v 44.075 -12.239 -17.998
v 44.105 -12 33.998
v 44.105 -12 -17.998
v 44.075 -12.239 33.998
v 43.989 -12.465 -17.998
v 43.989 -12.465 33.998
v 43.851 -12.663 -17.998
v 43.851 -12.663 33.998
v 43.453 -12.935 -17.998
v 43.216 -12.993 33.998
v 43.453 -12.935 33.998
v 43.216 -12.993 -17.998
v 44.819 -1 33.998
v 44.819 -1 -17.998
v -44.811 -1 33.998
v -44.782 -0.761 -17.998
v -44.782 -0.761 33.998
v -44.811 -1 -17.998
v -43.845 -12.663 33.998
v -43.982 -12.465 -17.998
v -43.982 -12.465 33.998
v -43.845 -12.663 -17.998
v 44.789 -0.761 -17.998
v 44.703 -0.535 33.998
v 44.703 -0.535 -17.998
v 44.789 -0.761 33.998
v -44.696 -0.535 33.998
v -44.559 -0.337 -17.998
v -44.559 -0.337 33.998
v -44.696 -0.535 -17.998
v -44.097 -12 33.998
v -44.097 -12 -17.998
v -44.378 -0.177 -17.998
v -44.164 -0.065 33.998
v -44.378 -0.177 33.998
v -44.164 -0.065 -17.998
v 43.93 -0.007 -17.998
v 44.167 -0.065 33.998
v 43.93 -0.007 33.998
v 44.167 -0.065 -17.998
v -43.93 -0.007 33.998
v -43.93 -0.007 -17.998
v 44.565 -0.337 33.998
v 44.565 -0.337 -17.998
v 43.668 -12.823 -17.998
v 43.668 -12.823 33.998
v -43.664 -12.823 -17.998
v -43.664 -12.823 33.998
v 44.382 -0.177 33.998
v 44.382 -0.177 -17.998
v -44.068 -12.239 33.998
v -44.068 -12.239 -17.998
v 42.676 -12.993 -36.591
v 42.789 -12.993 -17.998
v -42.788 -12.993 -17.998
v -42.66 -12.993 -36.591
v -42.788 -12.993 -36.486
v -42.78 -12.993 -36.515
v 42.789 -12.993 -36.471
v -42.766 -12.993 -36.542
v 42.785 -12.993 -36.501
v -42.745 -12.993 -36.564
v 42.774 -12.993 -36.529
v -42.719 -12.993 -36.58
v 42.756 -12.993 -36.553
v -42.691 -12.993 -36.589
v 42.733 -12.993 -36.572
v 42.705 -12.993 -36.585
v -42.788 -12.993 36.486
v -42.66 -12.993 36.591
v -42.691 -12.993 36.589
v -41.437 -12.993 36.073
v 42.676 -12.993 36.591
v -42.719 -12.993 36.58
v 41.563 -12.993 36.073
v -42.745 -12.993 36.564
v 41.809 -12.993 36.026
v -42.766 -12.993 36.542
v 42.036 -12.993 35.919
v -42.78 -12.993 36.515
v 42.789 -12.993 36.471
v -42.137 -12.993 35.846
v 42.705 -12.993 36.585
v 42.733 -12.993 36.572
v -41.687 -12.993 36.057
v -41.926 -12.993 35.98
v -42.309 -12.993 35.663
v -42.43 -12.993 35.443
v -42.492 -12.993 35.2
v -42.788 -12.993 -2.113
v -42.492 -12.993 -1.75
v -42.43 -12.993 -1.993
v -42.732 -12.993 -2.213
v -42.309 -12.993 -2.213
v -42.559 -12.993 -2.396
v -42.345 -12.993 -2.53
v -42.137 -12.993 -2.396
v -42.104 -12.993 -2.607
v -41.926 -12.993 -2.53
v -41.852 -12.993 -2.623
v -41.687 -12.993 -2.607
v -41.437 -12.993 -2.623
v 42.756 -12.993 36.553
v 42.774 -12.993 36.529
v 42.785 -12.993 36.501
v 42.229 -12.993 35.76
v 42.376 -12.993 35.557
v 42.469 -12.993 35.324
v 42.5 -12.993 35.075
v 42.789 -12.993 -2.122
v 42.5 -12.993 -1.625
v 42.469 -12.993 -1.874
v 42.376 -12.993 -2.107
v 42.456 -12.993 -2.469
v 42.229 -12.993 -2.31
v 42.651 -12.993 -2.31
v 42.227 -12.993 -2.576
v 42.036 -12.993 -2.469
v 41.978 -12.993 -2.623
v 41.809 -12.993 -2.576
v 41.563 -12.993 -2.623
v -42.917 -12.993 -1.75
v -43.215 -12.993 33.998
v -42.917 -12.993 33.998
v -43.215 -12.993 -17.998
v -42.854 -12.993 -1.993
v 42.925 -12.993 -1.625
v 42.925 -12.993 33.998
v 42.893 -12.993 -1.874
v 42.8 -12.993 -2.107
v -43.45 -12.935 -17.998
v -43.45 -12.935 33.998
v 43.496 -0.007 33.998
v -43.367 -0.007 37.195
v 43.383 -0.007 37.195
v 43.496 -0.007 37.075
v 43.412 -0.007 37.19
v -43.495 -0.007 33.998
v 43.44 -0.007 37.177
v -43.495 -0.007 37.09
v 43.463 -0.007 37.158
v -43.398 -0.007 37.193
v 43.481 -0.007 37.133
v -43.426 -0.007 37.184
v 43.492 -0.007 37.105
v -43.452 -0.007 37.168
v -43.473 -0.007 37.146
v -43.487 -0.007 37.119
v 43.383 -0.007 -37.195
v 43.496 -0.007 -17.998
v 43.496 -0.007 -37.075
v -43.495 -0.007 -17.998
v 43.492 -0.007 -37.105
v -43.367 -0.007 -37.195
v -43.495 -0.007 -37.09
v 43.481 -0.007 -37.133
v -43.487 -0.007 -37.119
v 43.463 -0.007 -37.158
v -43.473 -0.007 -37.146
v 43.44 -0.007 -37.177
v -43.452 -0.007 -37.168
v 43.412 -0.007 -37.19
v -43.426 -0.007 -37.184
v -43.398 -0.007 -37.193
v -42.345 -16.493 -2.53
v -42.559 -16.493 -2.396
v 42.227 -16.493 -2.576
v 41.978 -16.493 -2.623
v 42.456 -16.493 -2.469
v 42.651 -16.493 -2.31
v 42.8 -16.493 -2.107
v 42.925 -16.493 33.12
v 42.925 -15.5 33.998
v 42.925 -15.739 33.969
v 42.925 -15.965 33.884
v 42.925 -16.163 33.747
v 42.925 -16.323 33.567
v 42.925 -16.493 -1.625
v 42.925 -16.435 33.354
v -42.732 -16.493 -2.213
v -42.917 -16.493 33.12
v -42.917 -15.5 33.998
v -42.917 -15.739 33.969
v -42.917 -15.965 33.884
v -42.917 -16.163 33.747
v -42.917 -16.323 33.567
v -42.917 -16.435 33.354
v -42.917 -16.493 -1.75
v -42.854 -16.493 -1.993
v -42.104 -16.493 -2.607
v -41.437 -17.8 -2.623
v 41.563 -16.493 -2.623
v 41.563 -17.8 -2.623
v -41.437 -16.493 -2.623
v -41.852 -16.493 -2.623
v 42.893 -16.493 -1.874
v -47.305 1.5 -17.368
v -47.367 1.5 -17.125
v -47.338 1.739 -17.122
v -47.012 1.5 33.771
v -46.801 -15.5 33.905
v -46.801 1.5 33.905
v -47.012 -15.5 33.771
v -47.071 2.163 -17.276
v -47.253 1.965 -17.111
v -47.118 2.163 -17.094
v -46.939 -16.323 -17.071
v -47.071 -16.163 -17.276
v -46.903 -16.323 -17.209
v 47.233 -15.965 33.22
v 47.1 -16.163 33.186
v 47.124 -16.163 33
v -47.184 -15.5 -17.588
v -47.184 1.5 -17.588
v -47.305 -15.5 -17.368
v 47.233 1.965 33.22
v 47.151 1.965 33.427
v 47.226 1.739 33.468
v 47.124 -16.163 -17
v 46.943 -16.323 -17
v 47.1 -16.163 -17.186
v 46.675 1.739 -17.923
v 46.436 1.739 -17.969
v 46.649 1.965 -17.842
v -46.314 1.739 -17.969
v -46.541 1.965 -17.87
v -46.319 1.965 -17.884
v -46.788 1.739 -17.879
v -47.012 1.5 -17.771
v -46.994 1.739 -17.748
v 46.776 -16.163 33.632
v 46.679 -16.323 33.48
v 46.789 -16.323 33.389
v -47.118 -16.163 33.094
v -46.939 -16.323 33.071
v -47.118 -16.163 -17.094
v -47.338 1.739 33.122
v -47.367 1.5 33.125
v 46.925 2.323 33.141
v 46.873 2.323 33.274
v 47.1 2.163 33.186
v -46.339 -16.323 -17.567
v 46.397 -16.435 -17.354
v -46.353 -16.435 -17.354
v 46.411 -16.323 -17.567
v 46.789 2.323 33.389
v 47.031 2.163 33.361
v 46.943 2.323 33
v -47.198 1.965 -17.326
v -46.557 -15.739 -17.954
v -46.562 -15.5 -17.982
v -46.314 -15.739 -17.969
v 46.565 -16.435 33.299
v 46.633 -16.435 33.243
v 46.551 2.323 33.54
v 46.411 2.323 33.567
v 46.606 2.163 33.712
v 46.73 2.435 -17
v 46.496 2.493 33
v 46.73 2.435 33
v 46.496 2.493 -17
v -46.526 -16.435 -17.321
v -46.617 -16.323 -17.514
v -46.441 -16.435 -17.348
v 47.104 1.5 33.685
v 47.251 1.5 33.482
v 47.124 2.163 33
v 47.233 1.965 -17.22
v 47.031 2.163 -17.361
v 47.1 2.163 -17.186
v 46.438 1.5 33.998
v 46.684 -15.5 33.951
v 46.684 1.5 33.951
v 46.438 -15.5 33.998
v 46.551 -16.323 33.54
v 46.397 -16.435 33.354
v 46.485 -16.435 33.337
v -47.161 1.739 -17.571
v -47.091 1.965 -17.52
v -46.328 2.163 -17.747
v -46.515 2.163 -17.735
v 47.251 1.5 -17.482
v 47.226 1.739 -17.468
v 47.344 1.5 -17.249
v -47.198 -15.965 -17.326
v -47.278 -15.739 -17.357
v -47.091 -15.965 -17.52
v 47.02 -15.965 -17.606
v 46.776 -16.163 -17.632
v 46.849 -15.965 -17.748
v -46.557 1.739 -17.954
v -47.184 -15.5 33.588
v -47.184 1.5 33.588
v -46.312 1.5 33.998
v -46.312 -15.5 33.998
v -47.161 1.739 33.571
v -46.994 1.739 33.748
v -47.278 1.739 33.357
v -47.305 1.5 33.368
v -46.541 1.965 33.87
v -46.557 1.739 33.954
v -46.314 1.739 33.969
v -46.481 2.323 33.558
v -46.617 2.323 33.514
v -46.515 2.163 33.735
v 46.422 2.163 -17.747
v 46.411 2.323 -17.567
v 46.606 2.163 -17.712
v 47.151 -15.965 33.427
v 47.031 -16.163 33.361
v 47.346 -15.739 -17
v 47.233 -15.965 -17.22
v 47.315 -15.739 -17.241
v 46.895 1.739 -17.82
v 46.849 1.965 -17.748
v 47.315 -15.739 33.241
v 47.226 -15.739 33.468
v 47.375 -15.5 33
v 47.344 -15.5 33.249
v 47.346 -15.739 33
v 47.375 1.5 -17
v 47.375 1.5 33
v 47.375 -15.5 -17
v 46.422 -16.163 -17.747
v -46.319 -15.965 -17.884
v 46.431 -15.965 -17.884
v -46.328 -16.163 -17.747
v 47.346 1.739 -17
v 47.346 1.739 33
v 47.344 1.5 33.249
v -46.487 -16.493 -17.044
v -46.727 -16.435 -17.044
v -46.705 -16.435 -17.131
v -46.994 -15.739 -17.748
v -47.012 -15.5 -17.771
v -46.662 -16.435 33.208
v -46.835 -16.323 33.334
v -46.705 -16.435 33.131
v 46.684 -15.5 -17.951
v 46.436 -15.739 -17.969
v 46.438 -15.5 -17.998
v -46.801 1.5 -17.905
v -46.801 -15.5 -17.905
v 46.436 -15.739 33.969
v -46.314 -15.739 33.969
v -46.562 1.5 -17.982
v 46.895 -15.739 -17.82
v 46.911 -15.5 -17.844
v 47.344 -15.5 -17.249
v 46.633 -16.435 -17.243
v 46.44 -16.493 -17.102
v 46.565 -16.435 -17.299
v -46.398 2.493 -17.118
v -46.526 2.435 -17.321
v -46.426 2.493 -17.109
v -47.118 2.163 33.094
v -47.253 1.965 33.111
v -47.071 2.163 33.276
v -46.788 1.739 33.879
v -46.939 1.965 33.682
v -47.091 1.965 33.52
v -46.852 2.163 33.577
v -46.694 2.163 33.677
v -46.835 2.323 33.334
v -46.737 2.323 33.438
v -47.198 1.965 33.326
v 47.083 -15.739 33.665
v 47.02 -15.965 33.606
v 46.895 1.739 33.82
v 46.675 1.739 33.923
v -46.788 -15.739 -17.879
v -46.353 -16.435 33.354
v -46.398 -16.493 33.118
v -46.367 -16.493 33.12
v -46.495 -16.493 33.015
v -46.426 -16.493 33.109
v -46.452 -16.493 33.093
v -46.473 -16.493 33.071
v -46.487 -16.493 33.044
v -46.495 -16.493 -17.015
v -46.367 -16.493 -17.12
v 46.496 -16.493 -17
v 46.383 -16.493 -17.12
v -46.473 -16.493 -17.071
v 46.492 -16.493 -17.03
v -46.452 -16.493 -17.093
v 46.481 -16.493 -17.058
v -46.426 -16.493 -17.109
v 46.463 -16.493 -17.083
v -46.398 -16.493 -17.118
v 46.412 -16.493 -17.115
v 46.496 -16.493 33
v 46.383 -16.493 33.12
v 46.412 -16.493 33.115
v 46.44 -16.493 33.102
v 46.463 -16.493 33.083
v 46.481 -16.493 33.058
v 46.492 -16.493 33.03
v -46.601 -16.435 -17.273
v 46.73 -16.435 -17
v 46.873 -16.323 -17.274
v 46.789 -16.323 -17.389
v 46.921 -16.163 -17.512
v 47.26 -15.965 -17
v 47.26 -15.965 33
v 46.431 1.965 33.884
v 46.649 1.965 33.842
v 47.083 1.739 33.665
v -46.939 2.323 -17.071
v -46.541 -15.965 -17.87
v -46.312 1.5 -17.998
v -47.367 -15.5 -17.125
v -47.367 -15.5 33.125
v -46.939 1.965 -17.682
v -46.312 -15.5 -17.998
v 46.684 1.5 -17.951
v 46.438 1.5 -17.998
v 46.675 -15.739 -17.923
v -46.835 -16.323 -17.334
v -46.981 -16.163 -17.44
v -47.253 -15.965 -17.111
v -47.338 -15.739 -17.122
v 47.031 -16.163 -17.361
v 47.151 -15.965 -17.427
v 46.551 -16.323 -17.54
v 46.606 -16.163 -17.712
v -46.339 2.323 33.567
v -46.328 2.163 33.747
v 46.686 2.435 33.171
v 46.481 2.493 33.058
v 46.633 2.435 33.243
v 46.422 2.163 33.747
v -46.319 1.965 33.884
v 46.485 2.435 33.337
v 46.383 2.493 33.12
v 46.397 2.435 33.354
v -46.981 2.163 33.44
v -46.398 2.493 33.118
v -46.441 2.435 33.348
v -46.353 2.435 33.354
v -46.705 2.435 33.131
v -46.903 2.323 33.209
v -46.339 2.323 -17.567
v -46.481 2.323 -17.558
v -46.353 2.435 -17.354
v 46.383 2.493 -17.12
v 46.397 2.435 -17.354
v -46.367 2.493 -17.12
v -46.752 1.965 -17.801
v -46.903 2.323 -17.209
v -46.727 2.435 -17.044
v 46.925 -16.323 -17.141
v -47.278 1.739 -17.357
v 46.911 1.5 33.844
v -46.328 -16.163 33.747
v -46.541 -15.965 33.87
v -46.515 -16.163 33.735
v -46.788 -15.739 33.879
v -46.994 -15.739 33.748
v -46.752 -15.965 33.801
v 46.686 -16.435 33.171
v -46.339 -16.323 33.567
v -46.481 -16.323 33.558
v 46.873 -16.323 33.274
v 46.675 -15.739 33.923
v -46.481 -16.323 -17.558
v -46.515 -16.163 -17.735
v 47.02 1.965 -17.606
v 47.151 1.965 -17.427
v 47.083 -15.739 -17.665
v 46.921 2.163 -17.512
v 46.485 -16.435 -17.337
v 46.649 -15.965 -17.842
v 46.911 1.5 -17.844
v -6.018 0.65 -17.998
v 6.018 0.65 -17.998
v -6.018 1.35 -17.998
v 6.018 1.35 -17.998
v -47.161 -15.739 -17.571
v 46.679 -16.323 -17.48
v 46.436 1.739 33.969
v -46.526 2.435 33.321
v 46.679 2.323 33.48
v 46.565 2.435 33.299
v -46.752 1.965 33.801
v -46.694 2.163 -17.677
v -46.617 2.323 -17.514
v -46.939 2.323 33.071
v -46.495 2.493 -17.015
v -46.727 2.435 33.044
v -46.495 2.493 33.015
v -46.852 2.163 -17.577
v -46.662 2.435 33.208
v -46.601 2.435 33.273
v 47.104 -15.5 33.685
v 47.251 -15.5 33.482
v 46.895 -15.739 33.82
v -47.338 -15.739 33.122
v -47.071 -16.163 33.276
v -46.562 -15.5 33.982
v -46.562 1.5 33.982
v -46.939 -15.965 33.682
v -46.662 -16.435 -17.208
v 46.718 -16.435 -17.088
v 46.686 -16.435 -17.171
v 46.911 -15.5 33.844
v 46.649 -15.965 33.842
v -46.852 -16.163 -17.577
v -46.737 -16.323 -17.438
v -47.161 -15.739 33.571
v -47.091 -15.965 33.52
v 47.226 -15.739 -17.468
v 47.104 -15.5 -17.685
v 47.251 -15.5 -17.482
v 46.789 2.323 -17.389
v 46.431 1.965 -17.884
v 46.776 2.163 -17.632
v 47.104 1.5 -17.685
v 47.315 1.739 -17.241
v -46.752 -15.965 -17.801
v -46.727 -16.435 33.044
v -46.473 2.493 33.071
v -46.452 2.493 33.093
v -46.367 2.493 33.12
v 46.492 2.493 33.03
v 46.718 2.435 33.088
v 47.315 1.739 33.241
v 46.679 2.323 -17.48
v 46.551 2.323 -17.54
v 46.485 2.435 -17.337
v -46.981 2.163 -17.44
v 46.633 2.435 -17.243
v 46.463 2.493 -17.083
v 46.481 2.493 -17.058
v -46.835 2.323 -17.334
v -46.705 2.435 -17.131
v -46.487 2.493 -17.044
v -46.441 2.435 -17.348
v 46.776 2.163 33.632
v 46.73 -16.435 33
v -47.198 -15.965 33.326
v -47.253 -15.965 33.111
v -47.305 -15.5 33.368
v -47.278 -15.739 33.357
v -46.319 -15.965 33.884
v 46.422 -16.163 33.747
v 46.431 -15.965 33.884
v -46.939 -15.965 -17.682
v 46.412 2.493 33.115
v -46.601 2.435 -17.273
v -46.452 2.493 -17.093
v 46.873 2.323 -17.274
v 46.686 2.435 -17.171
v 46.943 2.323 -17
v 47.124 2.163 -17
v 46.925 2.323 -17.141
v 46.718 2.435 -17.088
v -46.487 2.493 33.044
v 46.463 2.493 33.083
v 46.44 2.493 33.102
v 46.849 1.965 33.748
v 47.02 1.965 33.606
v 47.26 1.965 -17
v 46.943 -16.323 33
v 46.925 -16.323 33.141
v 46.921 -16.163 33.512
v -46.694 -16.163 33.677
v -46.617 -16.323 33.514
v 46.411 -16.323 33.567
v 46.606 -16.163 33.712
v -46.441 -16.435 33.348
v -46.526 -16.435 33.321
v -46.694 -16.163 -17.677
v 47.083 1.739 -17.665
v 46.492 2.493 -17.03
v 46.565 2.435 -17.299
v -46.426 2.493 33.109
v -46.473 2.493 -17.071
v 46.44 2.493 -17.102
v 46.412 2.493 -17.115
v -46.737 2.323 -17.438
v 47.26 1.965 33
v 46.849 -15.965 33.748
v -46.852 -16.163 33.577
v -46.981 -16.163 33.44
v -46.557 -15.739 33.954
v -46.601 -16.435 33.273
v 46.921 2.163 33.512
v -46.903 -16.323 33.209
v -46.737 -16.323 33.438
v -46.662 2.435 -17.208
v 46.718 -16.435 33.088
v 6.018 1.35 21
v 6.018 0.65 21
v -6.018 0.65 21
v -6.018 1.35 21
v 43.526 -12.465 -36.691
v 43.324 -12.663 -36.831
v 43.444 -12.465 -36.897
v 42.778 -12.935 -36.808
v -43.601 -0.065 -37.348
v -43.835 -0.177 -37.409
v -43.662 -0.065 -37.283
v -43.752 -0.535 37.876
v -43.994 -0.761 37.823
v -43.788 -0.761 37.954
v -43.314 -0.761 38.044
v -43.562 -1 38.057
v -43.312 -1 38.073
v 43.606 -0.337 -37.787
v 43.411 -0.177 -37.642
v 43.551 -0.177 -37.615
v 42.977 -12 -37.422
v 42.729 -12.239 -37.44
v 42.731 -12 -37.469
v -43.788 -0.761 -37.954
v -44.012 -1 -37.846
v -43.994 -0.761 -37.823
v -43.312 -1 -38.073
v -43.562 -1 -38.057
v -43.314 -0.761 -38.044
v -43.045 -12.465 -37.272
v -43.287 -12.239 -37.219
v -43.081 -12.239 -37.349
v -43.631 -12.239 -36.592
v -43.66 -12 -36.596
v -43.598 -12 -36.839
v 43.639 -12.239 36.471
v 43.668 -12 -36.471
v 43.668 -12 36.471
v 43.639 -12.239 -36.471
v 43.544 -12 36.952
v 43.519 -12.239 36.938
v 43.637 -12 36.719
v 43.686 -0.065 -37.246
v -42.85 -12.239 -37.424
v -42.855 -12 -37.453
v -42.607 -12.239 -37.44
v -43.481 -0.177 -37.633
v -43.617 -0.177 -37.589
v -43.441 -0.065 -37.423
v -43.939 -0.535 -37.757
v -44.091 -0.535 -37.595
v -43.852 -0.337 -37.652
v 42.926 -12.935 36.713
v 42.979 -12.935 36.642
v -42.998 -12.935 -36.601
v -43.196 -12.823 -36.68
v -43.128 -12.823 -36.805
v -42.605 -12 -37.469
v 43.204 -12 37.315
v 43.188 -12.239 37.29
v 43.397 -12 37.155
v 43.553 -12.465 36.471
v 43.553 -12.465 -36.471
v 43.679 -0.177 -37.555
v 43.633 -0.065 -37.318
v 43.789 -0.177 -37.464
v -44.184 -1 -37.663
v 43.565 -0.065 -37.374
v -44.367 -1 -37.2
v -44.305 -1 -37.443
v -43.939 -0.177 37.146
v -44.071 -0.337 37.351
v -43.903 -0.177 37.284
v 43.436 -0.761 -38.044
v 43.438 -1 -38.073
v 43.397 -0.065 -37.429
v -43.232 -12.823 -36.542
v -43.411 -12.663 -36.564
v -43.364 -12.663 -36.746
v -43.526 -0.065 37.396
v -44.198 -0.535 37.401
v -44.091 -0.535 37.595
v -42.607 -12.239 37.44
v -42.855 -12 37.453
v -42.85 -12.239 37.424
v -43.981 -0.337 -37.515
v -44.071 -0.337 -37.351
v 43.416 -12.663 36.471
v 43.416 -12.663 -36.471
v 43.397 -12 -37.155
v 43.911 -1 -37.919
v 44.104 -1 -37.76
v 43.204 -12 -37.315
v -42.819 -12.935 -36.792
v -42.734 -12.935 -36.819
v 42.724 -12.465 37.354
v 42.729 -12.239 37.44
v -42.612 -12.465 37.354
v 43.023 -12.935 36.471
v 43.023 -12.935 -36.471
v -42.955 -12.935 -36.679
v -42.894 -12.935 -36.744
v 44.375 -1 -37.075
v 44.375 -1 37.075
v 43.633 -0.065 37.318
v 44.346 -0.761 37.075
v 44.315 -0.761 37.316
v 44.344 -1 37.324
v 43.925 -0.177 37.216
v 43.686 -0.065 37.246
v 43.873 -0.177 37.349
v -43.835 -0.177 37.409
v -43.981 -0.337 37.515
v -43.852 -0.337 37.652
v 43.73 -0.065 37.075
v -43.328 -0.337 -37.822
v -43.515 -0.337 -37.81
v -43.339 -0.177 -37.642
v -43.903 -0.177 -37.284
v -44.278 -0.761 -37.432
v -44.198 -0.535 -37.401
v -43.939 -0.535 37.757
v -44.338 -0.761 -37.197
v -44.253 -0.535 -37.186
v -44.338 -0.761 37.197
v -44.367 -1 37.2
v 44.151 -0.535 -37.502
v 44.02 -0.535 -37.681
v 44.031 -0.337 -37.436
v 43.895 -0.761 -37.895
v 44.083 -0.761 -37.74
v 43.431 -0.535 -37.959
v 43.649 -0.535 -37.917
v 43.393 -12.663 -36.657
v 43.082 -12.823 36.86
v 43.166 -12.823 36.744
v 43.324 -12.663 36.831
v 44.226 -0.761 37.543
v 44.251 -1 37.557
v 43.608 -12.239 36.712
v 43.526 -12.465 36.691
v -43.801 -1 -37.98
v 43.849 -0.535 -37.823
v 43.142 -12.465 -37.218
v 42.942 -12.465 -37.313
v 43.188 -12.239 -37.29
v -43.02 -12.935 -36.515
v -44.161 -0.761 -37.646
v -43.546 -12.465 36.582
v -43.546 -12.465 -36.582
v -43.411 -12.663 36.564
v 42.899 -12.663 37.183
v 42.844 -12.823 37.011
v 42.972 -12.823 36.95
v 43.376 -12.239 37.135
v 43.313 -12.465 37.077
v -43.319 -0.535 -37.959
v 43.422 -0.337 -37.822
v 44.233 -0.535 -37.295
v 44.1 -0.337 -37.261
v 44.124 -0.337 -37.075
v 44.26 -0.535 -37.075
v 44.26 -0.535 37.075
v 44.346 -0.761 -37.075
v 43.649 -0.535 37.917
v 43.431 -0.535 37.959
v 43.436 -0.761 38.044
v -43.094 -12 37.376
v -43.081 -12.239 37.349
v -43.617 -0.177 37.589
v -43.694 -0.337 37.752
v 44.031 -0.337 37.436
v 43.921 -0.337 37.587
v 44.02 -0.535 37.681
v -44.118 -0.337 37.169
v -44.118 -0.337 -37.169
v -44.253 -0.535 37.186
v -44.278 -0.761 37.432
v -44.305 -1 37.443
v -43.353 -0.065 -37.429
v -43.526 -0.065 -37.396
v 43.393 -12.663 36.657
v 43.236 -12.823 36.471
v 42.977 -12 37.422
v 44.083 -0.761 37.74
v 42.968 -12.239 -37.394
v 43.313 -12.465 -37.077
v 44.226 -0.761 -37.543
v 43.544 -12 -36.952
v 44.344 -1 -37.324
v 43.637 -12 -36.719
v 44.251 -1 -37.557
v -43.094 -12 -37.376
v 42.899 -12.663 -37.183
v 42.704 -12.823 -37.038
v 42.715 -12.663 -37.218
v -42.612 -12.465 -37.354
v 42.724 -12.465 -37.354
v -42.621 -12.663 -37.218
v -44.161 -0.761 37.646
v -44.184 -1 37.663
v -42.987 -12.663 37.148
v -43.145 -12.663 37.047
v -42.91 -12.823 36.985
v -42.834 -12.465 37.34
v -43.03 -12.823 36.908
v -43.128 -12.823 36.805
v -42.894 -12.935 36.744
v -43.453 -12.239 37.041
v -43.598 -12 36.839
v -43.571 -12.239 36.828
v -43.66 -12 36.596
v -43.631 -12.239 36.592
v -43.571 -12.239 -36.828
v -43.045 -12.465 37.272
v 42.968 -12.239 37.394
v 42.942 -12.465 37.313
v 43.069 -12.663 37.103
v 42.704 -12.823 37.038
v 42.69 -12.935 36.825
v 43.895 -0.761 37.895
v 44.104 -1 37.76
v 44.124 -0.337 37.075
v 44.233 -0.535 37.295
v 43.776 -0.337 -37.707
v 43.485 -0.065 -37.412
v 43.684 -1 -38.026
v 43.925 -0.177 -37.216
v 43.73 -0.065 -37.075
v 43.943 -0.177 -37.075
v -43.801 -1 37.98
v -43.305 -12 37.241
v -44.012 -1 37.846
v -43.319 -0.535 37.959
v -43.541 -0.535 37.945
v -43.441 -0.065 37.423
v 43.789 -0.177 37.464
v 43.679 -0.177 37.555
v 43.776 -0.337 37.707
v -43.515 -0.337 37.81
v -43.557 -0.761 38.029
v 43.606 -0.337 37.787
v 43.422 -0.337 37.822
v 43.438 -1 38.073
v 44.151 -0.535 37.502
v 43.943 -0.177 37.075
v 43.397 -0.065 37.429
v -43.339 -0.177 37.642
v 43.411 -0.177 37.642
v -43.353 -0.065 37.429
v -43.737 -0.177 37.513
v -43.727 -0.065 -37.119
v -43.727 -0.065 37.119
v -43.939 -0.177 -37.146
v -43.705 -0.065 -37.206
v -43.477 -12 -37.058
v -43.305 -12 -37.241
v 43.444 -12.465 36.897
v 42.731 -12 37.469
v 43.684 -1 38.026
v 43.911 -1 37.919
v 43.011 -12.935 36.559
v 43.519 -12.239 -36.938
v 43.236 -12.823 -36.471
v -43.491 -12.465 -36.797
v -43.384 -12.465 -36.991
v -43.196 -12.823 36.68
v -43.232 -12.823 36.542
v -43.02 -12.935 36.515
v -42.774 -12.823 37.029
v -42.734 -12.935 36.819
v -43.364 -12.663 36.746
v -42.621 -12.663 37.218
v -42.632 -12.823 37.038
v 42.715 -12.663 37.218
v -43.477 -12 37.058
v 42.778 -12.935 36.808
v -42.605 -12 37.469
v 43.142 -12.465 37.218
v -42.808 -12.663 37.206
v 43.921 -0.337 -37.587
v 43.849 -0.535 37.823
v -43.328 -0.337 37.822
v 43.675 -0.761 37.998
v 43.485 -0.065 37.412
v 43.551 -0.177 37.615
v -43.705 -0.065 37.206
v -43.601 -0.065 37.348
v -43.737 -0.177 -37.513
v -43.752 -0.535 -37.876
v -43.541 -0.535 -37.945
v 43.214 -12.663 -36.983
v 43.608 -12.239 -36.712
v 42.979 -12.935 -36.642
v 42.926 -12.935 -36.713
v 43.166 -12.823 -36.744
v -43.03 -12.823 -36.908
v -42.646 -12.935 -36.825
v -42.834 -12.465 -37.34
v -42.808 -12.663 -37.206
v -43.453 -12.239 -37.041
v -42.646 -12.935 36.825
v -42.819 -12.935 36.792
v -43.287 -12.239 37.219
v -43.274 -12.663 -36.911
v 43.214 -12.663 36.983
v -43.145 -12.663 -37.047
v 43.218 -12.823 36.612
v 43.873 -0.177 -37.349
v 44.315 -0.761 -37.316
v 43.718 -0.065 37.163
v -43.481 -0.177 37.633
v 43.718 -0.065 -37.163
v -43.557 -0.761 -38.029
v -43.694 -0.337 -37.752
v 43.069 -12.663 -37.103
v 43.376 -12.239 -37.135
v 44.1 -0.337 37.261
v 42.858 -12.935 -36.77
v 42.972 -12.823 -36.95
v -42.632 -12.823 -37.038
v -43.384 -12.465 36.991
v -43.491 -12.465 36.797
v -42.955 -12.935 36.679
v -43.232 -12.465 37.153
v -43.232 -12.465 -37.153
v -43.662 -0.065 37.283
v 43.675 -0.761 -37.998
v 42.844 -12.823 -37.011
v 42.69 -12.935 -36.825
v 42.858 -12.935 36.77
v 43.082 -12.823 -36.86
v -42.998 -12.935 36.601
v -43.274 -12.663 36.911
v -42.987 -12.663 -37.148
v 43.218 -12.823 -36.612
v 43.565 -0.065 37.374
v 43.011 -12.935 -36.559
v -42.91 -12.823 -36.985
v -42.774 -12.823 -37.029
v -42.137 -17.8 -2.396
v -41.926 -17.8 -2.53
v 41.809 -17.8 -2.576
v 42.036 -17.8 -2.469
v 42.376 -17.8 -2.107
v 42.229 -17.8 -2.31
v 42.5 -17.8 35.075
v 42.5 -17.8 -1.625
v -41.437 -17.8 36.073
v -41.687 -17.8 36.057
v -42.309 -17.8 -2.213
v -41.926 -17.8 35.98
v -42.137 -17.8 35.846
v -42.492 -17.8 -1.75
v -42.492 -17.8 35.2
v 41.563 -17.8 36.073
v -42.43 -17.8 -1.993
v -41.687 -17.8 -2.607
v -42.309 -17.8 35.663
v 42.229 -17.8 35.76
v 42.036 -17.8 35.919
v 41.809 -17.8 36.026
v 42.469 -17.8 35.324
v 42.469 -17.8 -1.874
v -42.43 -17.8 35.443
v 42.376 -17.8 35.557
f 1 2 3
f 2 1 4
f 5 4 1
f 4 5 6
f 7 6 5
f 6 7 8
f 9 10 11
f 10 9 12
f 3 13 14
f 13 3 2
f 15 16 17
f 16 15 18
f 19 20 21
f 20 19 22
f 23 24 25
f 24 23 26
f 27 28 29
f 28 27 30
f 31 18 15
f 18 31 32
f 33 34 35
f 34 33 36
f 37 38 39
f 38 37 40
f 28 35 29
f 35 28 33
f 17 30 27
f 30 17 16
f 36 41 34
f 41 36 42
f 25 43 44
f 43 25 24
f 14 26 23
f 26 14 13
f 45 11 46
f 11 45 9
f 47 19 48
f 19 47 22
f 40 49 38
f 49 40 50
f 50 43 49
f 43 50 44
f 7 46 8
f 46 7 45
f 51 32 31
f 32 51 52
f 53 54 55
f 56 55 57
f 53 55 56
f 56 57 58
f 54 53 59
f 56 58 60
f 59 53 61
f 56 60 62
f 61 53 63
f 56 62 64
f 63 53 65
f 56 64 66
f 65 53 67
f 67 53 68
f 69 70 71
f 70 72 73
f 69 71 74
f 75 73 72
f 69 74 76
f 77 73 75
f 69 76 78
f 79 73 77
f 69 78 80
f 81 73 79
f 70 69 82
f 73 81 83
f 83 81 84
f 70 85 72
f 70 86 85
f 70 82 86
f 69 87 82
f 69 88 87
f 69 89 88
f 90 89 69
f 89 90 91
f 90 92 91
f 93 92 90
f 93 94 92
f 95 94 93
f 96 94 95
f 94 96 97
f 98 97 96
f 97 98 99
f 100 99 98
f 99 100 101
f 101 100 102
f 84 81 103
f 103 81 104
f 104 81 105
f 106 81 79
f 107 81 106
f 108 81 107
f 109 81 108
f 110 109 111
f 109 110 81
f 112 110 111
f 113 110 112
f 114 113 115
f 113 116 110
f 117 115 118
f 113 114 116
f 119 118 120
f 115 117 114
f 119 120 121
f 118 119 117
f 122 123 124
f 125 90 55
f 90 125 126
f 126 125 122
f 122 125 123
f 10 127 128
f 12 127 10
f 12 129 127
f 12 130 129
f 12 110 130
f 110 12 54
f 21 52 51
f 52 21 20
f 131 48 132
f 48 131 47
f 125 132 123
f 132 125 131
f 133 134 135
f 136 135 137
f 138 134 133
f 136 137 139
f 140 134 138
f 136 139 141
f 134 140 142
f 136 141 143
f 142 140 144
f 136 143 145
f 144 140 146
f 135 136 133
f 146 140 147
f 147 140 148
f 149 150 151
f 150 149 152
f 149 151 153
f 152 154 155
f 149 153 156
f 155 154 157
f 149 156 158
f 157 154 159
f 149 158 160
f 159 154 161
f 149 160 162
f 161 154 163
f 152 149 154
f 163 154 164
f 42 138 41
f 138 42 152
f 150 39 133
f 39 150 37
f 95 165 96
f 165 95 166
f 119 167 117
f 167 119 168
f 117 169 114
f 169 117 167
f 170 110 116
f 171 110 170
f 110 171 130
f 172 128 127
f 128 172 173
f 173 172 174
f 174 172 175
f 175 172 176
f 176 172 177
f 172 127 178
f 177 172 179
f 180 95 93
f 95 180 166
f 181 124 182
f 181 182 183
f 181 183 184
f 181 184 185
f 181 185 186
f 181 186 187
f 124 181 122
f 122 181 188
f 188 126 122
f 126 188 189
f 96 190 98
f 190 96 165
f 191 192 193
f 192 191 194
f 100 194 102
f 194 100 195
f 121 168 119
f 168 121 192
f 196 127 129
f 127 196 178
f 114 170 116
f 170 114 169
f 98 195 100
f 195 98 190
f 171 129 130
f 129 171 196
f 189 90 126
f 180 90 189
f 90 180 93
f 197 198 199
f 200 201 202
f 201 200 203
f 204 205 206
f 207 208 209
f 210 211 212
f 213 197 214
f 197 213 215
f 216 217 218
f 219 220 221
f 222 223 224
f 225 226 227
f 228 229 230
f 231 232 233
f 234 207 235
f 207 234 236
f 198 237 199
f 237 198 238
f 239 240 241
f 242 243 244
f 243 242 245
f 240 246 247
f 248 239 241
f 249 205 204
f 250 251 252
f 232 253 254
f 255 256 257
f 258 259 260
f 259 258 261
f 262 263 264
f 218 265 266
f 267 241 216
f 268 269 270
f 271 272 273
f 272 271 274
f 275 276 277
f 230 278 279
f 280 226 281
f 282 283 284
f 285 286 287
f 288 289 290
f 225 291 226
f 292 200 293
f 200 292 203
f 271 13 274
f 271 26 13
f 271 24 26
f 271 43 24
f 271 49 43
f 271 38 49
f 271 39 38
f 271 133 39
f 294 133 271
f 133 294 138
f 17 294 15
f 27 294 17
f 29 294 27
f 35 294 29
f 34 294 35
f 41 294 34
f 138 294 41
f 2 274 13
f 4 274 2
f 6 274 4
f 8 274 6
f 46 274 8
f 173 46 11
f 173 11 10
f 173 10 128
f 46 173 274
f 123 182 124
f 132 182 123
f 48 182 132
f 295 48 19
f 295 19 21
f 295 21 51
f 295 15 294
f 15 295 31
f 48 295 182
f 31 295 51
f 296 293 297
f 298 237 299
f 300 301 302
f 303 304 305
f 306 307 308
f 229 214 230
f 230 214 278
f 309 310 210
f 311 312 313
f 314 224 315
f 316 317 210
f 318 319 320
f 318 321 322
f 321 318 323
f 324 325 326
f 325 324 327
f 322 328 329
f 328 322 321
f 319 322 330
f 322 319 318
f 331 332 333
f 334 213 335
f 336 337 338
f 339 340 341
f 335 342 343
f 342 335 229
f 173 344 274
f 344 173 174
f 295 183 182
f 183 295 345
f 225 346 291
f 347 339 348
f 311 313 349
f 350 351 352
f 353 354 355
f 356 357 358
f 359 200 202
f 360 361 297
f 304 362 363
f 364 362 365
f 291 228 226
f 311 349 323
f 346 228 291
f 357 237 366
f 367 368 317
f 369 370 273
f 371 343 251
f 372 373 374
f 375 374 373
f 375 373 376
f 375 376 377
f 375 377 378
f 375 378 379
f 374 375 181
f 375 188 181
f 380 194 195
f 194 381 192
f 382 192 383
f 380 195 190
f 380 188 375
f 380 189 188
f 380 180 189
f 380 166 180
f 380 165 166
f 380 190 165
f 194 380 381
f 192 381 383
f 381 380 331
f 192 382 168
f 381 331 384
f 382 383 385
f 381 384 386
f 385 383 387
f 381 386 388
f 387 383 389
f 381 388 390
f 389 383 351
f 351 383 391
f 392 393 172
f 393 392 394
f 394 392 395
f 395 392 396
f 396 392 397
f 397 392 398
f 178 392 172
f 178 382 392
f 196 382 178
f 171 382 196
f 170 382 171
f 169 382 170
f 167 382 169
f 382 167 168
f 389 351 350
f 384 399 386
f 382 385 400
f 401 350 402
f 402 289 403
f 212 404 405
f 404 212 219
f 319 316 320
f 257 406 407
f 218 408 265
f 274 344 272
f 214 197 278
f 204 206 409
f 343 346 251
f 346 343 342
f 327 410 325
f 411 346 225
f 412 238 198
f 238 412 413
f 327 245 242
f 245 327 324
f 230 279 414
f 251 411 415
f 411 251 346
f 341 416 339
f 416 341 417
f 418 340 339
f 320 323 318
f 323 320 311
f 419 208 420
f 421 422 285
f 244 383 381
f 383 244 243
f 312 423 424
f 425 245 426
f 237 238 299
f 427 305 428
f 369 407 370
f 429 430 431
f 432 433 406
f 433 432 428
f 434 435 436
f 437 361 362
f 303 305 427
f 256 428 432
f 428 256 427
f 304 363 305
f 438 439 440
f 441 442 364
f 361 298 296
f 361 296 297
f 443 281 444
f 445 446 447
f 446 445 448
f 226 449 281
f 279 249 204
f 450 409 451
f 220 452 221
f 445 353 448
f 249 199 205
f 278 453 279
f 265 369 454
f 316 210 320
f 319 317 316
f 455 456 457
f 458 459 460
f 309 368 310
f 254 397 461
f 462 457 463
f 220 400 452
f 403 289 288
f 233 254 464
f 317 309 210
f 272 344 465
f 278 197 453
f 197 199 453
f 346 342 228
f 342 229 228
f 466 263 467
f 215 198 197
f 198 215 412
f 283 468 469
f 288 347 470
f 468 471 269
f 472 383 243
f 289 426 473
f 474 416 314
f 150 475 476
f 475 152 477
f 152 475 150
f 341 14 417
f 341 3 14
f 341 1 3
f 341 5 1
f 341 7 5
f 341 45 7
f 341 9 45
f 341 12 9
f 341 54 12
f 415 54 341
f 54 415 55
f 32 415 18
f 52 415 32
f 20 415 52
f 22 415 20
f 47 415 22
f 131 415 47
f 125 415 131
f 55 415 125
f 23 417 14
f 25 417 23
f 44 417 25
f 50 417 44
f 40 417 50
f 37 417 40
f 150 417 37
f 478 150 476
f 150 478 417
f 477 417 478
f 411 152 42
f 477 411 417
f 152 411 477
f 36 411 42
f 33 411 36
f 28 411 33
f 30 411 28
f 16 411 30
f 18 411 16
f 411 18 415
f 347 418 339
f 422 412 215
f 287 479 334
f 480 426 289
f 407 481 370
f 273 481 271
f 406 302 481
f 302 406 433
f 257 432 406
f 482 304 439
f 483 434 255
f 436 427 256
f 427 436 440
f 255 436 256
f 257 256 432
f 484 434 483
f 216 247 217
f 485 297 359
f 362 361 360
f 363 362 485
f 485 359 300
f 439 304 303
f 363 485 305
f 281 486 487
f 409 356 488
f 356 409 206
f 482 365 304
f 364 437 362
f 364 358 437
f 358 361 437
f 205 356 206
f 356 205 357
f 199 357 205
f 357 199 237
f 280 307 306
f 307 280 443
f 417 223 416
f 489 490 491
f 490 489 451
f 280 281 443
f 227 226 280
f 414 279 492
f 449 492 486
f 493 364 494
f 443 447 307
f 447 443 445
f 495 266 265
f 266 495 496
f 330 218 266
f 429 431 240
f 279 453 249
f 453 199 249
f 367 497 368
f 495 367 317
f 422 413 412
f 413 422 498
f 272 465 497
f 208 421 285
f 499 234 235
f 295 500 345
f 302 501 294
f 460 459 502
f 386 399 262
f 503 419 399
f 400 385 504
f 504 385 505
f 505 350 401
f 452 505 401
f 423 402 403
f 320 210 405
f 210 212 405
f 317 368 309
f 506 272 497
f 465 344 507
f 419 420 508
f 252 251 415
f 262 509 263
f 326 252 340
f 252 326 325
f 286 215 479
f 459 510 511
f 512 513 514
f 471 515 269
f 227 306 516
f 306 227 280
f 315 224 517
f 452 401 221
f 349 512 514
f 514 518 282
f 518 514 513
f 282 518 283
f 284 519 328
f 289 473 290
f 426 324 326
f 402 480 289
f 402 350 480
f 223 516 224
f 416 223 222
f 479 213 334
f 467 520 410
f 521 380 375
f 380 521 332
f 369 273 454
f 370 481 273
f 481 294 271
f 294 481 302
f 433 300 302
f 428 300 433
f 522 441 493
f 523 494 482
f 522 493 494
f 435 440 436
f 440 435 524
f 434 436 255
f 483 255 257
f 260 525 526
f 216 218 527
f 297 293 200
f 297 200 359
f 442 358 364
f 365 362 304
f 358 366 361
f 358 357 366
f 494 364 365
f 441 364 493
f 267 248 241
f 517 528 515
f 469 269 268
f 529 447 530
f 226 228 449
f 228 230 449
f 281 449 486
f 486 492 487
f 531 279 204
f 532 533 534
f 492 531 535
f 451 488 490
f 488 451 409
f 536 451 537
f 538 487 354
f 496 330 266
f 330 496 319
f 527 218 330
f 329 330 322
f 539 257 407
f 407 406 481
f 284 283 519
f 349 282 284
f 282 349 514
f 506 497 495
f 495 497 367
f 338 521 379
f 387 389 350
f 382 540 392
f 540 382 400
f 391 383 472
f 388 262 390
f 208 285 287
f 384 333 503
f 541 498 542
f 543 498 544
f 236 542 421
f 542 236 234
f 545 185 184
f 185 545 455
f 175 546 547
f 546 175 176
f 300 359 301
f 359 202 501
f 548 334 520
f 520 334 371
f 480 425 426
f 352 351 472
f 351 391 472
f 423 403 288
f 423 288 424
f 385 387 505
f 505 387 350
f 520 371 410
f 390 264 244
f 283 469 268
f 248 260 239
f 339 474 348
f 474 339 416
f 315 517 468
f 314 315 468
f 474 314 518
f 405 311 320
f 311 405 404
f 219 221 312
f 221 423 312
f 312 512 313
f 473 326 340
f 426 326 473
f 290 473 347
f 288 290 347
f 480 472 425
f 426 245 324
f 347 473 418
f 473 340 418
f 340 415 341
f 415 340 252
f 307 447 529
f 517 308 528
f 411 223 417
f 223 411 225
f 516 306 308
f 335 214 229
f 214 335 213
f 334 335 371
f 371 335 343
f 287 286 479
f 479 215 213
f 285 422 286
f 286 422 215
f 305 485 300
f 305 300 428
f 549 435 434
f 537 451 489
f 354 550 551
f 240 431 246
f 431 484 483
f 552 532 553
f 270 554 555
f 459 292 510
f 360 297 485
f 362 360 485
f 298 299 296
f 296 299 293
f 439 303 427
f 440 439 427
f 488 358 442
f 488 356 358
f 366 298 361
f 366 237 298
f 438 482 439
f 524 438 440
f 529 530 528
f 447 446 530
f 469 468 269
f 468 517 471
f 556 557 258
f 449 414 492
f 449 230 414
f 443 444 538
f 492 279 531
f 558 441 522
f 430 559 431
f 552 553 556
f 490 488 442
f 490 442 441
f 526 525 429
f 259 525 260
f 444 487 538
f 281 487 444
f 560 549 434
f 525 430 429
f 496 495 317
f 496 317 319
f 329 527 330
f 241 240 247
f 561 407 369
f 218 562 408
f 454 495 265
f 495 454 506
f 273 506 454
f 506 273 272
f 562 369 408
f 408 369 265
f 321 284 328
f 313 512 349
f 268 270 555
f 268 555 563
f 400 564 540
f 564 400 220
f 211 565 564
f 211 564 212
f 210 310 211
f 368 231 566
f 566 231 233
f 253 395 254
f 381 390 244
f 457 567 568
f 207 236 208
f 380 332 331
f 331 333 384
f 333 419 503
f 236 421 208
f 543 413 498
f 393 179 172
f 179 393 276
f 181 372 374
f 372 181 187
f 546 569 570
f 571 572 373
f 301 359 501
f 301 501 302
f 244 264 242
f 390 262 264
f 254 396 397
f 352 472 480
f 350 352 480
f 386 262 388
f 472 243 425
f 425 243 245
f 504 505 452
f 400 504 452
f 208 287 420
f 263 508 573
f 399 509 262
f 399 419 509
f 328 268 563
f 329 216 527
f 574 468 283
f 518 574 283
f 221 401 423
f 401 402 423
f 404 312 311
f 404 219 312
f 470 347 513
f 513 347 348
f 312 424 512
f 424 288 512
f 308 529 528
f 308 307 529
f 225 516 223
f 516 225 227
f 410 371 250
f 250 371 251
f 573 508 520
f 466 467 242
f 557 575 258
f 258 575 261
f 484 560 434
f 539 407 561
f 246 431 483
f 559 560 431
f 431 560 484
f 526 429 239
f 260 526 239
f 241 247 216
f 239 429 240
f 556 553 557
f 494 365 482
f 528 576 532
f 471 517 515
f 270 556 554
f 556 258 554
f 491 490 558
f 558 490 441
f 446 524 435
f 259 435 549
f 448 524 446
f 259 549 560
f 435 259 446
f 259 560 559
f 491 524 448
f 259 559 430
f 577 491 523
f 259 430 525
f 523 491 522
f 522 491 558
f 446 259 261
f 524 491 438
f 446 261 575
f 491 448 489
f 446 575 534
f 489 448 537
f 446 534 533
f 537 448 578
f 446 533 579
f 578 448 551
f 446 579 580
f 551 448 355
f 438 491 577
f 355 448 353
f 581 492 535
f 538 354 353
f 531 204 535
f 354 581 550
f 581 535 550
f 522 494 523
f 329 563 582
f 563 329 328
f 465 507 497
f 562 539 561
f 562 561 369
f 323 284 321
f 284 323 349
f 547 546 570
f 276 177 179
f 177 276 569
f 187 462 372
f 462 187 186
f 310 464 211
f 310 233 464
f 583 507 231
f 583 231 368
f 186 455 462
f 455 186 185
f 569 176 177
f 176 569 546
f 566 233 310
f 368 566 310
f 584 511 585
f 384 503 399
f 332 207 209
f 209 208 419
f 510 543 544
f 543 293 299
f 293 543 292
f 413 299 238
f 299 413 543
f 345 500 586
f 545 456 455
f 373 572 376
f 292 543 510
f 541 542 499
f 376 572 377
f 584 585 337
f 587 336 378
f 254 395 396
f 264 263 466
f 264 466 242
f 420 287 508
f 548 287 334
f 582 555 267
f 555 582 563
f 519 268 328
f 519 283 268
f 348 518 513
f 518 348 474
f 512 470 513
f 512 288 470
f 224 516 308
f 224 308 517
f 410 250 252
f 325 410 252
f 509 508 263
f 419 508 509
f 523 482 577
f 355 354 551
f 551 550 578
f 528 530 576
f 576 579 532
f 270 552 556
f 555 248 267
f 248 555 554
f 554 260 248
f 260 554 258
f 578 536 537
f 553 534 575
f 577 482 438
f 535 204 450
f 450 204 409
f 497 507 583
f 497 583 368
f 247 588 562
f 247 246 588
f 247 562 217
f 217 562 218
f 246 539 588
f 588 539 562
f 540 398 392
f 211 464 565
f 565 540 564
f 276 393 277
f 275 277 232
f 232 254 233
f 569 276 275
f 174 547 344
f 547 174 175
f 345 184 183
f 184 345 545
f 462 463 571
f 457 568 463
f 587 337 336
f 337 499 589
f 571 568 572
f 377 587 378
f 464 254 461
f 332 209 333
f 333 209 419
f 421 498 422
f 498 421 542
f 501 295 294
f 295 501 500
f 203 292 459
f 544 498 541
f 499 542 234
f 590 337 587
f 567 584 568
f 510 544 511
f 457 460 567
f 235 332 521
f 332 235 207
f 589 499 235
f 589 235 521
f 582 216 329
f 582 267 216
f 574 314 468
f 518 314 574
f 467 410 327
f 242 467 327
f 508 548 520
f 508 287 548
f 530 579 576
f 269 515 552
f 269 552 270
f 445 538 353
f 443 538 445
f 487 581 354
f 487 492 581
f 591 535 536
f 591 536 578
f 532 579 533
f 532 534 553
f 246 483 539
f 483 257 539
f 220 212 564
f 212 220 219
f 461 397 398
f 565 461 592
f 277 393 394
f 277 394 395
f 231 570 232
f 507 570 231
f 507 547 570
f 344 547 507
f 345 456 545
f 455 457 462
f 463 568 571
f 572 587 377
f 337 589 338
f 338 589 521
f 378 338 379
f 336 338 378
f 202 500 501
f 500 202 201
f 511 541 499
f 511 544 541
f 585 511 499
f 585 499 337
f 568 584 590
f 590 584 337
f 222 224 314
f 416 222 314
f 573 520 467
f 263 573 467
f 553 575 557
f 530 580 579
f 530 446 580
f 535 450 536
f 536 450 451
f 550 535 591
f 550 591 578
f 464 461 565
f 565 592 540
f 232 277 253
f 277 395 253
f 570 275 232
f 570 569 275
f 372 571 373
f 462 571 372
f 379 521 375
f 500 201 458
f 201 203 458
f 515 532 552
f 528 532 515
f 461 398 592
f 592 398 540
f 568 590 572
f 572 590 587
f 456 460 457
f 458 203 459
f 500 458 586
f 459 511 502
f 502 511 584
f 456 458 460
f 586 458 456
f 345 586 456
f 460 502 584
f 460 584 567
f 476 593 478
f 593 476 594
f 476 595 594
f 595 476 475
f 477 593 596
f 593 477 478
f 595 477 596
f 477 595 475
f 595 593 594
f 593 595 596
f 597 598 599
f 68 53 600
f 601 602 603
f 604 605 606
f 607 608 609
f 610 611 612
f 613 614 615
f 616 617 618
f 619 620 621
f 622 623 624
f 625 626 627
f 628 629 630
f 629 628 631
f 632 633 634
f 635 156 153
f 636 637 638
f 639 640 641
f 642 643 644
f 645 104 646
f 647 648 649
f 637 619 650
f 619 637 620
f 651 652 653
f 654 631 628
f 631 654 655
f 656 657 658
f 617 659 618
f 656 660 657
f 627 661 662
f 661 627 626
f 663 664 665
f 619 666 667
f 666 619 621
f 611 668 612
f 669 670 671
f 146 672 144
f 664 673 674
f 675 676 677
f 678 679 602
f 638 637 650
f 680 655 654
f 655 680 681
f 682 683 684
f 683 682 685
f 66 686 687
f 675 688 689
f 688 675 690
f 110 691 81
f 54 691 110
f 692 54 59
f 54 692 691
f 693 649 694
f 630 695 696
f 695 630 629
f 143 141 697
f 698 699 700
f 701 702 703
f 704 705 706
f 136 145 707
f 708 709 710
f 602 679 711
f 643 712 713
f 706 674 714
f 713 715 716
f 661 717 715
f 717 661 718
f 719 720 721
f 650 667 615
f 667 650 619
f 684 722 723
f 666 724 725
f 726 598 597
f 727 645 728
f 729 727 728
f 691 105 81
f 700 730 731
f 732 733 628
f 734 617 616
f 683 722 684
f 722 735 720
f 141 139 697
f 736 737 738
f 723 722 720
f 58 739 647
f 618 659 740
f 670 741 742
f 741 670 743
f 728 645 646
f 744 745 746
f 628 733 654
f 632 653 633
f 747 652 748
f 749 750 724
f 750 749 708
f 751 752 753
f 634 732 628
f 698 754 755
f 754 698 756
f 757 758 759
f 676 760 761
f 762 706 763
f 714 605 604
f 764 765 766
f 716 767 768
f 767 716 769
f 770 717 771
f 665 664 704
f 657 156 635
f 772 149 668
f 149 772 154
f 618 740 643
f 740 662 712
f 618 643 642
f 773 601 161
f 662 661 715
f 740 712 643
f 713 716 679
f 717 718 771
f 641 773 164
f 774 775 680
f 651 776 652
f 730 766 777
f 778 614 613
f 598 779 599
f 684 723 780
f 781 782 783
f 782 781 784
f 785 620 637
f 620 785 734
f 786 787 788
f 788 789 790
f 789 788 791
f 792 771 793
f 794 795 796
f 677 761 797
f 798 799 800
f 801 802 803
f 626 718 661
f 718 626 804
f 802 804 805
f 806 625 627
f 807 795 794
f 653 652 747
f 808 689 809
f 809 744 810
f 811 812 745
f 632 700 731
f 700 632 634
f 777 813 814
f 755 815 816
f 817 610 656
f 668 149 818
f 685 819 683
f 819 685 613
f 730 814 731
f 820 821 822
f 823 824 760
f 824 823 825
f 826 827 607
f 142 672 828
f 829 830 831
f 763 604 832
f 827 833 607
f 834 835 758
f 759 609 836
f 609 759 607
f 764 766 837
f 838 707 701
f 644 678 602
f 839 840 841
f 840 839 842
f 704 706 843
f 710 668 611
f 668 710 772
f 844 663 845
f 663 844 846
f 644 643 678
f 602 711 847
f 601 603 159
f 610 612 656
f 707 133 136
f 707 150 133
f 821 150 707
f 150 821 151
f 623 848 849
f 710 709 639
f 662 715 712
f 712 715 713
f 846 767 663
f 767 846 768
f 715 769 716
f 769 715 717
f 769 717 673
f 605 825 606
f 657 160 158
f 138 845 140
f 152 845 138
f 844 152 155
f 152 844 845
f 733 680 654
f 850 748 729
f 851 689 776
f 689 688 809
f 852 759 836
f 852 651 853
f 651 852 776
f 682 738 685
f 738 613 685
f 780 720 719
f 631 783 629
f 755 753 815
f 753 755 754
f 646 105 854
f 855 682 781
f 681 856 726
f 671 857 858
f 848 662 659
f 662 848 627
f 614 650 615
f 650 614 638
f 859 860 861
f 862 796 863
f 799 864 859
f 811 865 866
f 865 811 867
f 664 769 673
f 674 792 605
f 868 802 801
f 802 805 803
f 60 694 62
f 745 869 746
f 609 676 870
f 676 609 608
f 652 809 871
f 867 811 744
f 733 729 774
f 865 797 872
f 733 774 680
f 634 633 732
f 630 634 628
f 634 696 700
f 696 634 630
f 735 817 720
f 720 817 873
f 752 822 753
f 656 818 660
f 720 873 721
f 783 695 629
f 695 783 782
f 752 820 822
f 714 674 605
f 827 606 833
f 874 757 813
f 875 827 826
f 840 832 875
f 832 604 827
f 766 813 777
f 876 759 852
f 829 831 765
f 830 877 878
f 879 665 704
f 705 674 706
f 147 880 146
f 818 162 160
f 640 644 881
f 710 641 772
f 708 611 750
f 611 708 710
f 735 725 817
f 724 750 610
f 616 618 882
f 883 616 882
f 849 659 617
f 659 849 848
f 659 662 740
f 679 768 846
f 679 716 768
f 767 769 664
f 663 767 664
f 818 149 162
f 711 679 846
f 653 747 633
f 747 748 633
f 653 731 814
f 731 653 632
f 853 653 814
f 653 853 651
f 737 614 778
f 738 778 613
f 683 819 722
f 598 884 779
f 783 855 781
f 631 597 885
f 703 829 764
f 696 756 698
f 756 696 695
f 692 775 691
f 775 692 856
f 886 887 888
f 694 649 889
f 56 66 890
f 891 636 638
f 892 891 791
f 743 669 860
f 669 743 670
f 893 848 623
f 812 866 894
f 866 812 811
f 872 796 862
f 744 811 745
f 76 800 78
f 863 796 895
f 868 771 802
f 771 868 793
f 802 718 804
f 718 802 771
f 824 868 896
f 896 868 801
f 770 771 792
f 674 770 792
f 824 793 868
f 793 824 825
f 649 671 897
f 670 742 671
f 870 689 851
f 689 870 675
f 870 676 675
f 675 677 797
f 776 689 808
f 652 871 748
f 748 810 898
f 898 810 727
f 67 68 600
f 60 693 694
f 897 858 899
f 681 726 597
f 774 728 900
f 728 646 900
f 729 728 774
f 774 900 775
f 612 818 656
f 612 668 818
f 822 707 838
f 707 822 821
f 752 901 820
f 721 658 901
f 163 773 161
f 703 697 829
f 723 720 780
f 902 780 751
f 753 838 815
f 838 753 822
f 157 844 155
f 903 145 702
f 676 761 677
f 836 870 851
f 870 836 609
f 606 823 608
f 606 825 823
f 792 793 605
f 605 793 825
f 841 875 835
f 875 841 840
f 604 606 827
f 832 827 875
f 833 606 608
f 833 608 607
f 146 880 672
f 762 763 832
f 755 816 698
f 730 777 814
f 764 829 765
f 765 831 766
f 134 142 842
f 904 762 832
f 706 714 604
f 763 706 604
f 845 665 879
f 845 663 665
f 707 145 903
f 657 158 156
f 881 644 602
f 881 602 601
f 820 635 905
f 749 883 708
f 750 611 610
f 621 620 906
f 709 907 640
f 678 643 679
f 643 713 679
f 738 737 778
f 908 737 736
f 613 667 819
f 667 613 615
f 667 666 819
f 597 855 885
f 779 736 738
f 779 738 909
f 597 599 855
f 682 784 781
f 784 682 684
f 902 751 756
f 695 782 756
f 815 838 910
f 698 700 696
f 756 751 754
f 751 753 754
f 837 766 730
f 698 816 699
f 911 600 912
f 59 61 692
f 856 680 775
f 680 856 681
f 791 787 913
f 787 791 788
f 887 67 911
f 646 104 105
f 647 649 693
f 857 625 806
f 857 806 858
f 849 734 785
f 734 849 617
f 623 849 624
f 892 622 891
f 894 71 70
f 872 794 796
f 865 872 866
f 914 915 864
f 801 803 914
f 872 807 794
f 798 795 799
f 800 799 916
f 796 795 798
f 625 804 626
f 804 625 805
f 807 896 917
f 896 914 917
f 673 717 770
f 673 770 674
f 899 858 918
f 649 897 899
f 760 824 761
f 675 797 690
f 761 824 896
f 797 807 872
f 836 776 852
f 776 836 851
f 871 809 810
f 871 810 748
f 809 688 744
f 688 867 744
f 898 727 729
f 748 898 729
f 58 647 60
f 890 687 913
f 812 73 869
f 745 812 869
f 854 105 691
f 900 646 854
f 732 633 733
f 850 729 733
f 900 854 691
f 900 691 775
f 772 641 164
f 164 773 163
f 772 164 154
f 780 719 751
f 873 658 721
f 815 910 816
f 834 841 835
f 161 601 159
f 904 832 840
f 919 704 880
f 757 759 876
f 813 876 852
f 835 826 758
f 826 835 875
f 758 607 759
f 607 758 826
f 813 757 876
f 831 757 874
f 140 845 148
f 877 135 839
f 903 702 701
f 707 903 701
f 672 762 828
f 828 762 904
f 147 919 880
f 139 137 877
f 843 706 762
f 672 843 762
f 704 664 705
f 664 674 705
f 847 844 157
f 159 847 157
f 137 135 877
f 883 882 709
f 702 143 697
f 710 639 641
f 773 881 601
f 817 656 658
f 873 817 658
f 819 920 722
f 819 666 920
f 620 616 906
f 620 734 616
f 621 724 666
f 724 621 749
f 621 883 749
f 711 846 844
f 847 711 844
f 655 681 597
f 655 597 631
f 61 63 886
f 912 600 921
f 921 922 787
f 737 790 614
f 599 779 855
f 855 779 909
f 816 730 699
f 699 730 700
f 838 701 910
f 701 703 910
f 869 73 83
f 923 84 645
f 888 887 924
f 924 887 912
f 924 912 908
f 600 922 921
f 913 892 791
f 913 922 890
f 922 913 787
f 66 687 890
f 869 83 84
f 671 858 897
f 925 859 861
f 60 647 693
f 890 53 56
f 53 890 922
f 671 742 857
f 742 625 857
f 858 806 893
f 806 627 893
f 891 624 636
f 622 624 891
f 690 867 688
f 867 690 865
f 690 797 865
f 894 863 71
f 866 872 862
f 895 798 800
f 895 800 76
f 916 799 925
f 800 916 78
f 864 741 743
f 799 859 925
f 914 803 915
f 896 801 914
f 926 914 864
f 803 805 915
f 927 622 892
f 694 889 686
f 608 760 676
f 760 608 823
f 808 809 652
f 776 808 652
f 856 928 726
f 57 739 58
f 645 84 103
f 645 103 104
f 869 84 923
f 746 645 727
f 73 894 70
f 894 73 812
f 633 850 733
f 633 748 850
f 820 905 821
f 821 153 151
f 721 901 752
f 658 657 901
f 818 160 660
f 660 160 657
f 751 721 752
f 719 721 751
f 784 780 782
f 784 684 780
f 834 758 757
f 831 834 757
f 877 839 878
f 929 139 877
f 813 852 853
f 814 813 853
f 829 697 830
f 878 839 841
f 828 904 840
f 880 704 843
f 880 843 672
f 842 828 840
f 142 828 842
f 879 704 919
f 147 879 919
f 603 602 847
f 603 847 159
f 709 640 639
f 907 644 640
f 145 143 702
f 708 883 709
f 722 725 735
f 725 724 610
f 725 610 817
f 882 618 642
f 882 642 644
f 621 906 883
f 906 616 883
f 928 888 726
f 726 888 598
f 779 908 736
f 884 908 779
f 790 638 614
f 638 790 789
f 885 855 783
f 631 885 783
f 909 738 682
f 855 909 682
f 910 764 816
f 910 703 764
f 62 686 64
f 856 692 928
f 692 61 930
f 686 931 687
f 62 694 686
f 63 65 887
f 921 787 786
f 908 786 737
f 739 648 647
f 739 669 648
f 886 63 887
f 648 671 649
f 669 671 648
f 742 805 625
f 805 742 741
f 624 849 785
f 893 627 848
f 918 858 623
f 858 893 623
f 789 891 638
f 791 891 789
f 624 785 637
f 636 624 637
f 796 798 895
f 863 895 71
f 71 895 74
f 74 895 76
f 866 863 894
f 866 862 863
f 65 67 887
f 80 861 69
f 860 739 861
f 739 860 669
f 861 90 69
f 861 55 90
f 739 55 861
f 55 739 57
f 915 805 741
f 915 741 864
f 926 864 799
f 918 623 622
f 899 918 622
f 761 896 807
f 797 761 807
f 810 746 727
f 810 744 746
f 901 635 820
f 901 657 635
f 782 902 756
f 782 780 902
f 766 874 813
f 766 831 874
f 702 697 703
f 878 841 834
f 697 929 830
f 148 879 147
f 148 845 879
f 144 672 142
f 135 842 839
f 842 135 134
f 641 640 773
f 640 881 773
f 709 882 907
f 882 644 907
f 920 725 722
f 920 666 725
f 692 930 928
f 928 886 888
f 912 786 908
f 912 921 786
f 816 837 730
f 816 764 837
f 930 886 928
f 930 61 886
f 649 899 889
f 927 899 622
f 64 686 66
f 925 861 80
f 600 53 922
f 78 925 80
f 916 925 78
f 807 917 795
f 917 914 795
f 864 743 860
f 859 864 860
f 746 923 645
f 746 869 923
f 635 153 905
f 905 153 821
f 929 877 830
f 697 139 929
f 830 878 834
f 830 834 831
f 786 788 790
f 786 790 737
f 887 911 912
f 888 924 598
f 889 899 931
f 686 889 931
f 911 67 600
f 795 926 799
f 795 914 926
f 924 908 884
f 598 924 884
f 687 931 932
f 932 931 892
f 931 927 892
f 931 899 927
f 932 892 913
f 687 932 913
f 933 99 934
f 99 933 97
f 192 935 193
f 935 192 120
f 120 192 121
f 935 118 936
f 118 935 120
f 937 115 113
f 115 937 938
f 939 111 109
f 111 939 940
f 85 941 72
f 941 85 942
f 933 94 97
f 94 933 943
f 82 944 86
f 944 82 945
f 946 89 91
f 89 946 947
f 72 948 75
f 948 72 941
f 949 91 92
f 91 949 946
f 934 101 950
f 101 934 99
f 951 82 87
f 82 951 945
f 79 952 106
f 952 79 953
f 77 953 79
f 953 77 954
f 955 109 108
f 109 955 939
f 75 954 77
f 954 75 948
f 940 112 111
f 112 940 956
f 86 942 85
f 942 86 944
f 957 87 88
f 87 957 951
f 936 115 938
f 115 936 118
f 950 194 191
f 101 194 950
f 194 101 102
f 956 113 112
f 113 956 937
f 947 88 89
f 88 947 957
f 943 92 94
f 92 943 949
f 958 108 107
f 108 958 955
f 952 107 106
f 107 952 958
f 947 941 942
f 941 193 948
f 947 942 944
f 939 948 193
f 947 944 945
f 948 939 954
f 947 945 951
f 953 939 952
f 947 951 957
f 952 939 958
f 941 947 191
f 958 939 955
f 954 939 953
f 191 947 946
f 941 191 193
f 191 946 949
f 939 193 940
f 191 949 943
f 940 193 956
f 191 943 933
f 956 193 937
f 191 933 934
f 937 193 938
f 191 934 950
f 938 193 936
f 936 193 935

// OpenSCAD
$fn=25;
ezWidth = 88.75;
ezLength = 76.15;
ezHeight = 13;
smooth = 1;

module ezpass() {
    // base
    translate([0,0,smooth]) minkowski() {
        linear_extrude(height=ezHeight-smooth*2,scale=.9837) {
            square([ezWidth-smooth*2,ezLength-smooth*2], center=true);
        }
        sphere(1);
    }
    
    // top bump
    bumpWidth = 84;
    bumpLength = 37.7;
    bumpHeight = 5.3;
    minkowski() {
        translate([0,ezLength/2 - bumpLength/2 - 2 - smooth/2,ezHeight+bumpHeight/2-smooth/2-1])
           cube([bumpWidth-smooth,bumpLength-smooth,bumpHeight-smooth+1], center=true);
        cylinder(r=smooth);
    }
}
module clip() {
    cube([11.8,42,0.7],center=true);
}
module tray() {
    minkowski() {
        // size up tray to ezpass dimensions with 2mm padding
        translate([0,8,13-6]) cube([ezWidth+4,50,ezHeight+4], center=true);
        sphere(1);
    }
}

module v1() {
    difference() {
        tray();
        scale([1.01,1,1]) ezpass();
        translate([0,0,-1]) scale([1.02,1,1]) clip();
    }
}
rotate([90,0,0]) v1();
rotate([90,0,0]) ezpass();
